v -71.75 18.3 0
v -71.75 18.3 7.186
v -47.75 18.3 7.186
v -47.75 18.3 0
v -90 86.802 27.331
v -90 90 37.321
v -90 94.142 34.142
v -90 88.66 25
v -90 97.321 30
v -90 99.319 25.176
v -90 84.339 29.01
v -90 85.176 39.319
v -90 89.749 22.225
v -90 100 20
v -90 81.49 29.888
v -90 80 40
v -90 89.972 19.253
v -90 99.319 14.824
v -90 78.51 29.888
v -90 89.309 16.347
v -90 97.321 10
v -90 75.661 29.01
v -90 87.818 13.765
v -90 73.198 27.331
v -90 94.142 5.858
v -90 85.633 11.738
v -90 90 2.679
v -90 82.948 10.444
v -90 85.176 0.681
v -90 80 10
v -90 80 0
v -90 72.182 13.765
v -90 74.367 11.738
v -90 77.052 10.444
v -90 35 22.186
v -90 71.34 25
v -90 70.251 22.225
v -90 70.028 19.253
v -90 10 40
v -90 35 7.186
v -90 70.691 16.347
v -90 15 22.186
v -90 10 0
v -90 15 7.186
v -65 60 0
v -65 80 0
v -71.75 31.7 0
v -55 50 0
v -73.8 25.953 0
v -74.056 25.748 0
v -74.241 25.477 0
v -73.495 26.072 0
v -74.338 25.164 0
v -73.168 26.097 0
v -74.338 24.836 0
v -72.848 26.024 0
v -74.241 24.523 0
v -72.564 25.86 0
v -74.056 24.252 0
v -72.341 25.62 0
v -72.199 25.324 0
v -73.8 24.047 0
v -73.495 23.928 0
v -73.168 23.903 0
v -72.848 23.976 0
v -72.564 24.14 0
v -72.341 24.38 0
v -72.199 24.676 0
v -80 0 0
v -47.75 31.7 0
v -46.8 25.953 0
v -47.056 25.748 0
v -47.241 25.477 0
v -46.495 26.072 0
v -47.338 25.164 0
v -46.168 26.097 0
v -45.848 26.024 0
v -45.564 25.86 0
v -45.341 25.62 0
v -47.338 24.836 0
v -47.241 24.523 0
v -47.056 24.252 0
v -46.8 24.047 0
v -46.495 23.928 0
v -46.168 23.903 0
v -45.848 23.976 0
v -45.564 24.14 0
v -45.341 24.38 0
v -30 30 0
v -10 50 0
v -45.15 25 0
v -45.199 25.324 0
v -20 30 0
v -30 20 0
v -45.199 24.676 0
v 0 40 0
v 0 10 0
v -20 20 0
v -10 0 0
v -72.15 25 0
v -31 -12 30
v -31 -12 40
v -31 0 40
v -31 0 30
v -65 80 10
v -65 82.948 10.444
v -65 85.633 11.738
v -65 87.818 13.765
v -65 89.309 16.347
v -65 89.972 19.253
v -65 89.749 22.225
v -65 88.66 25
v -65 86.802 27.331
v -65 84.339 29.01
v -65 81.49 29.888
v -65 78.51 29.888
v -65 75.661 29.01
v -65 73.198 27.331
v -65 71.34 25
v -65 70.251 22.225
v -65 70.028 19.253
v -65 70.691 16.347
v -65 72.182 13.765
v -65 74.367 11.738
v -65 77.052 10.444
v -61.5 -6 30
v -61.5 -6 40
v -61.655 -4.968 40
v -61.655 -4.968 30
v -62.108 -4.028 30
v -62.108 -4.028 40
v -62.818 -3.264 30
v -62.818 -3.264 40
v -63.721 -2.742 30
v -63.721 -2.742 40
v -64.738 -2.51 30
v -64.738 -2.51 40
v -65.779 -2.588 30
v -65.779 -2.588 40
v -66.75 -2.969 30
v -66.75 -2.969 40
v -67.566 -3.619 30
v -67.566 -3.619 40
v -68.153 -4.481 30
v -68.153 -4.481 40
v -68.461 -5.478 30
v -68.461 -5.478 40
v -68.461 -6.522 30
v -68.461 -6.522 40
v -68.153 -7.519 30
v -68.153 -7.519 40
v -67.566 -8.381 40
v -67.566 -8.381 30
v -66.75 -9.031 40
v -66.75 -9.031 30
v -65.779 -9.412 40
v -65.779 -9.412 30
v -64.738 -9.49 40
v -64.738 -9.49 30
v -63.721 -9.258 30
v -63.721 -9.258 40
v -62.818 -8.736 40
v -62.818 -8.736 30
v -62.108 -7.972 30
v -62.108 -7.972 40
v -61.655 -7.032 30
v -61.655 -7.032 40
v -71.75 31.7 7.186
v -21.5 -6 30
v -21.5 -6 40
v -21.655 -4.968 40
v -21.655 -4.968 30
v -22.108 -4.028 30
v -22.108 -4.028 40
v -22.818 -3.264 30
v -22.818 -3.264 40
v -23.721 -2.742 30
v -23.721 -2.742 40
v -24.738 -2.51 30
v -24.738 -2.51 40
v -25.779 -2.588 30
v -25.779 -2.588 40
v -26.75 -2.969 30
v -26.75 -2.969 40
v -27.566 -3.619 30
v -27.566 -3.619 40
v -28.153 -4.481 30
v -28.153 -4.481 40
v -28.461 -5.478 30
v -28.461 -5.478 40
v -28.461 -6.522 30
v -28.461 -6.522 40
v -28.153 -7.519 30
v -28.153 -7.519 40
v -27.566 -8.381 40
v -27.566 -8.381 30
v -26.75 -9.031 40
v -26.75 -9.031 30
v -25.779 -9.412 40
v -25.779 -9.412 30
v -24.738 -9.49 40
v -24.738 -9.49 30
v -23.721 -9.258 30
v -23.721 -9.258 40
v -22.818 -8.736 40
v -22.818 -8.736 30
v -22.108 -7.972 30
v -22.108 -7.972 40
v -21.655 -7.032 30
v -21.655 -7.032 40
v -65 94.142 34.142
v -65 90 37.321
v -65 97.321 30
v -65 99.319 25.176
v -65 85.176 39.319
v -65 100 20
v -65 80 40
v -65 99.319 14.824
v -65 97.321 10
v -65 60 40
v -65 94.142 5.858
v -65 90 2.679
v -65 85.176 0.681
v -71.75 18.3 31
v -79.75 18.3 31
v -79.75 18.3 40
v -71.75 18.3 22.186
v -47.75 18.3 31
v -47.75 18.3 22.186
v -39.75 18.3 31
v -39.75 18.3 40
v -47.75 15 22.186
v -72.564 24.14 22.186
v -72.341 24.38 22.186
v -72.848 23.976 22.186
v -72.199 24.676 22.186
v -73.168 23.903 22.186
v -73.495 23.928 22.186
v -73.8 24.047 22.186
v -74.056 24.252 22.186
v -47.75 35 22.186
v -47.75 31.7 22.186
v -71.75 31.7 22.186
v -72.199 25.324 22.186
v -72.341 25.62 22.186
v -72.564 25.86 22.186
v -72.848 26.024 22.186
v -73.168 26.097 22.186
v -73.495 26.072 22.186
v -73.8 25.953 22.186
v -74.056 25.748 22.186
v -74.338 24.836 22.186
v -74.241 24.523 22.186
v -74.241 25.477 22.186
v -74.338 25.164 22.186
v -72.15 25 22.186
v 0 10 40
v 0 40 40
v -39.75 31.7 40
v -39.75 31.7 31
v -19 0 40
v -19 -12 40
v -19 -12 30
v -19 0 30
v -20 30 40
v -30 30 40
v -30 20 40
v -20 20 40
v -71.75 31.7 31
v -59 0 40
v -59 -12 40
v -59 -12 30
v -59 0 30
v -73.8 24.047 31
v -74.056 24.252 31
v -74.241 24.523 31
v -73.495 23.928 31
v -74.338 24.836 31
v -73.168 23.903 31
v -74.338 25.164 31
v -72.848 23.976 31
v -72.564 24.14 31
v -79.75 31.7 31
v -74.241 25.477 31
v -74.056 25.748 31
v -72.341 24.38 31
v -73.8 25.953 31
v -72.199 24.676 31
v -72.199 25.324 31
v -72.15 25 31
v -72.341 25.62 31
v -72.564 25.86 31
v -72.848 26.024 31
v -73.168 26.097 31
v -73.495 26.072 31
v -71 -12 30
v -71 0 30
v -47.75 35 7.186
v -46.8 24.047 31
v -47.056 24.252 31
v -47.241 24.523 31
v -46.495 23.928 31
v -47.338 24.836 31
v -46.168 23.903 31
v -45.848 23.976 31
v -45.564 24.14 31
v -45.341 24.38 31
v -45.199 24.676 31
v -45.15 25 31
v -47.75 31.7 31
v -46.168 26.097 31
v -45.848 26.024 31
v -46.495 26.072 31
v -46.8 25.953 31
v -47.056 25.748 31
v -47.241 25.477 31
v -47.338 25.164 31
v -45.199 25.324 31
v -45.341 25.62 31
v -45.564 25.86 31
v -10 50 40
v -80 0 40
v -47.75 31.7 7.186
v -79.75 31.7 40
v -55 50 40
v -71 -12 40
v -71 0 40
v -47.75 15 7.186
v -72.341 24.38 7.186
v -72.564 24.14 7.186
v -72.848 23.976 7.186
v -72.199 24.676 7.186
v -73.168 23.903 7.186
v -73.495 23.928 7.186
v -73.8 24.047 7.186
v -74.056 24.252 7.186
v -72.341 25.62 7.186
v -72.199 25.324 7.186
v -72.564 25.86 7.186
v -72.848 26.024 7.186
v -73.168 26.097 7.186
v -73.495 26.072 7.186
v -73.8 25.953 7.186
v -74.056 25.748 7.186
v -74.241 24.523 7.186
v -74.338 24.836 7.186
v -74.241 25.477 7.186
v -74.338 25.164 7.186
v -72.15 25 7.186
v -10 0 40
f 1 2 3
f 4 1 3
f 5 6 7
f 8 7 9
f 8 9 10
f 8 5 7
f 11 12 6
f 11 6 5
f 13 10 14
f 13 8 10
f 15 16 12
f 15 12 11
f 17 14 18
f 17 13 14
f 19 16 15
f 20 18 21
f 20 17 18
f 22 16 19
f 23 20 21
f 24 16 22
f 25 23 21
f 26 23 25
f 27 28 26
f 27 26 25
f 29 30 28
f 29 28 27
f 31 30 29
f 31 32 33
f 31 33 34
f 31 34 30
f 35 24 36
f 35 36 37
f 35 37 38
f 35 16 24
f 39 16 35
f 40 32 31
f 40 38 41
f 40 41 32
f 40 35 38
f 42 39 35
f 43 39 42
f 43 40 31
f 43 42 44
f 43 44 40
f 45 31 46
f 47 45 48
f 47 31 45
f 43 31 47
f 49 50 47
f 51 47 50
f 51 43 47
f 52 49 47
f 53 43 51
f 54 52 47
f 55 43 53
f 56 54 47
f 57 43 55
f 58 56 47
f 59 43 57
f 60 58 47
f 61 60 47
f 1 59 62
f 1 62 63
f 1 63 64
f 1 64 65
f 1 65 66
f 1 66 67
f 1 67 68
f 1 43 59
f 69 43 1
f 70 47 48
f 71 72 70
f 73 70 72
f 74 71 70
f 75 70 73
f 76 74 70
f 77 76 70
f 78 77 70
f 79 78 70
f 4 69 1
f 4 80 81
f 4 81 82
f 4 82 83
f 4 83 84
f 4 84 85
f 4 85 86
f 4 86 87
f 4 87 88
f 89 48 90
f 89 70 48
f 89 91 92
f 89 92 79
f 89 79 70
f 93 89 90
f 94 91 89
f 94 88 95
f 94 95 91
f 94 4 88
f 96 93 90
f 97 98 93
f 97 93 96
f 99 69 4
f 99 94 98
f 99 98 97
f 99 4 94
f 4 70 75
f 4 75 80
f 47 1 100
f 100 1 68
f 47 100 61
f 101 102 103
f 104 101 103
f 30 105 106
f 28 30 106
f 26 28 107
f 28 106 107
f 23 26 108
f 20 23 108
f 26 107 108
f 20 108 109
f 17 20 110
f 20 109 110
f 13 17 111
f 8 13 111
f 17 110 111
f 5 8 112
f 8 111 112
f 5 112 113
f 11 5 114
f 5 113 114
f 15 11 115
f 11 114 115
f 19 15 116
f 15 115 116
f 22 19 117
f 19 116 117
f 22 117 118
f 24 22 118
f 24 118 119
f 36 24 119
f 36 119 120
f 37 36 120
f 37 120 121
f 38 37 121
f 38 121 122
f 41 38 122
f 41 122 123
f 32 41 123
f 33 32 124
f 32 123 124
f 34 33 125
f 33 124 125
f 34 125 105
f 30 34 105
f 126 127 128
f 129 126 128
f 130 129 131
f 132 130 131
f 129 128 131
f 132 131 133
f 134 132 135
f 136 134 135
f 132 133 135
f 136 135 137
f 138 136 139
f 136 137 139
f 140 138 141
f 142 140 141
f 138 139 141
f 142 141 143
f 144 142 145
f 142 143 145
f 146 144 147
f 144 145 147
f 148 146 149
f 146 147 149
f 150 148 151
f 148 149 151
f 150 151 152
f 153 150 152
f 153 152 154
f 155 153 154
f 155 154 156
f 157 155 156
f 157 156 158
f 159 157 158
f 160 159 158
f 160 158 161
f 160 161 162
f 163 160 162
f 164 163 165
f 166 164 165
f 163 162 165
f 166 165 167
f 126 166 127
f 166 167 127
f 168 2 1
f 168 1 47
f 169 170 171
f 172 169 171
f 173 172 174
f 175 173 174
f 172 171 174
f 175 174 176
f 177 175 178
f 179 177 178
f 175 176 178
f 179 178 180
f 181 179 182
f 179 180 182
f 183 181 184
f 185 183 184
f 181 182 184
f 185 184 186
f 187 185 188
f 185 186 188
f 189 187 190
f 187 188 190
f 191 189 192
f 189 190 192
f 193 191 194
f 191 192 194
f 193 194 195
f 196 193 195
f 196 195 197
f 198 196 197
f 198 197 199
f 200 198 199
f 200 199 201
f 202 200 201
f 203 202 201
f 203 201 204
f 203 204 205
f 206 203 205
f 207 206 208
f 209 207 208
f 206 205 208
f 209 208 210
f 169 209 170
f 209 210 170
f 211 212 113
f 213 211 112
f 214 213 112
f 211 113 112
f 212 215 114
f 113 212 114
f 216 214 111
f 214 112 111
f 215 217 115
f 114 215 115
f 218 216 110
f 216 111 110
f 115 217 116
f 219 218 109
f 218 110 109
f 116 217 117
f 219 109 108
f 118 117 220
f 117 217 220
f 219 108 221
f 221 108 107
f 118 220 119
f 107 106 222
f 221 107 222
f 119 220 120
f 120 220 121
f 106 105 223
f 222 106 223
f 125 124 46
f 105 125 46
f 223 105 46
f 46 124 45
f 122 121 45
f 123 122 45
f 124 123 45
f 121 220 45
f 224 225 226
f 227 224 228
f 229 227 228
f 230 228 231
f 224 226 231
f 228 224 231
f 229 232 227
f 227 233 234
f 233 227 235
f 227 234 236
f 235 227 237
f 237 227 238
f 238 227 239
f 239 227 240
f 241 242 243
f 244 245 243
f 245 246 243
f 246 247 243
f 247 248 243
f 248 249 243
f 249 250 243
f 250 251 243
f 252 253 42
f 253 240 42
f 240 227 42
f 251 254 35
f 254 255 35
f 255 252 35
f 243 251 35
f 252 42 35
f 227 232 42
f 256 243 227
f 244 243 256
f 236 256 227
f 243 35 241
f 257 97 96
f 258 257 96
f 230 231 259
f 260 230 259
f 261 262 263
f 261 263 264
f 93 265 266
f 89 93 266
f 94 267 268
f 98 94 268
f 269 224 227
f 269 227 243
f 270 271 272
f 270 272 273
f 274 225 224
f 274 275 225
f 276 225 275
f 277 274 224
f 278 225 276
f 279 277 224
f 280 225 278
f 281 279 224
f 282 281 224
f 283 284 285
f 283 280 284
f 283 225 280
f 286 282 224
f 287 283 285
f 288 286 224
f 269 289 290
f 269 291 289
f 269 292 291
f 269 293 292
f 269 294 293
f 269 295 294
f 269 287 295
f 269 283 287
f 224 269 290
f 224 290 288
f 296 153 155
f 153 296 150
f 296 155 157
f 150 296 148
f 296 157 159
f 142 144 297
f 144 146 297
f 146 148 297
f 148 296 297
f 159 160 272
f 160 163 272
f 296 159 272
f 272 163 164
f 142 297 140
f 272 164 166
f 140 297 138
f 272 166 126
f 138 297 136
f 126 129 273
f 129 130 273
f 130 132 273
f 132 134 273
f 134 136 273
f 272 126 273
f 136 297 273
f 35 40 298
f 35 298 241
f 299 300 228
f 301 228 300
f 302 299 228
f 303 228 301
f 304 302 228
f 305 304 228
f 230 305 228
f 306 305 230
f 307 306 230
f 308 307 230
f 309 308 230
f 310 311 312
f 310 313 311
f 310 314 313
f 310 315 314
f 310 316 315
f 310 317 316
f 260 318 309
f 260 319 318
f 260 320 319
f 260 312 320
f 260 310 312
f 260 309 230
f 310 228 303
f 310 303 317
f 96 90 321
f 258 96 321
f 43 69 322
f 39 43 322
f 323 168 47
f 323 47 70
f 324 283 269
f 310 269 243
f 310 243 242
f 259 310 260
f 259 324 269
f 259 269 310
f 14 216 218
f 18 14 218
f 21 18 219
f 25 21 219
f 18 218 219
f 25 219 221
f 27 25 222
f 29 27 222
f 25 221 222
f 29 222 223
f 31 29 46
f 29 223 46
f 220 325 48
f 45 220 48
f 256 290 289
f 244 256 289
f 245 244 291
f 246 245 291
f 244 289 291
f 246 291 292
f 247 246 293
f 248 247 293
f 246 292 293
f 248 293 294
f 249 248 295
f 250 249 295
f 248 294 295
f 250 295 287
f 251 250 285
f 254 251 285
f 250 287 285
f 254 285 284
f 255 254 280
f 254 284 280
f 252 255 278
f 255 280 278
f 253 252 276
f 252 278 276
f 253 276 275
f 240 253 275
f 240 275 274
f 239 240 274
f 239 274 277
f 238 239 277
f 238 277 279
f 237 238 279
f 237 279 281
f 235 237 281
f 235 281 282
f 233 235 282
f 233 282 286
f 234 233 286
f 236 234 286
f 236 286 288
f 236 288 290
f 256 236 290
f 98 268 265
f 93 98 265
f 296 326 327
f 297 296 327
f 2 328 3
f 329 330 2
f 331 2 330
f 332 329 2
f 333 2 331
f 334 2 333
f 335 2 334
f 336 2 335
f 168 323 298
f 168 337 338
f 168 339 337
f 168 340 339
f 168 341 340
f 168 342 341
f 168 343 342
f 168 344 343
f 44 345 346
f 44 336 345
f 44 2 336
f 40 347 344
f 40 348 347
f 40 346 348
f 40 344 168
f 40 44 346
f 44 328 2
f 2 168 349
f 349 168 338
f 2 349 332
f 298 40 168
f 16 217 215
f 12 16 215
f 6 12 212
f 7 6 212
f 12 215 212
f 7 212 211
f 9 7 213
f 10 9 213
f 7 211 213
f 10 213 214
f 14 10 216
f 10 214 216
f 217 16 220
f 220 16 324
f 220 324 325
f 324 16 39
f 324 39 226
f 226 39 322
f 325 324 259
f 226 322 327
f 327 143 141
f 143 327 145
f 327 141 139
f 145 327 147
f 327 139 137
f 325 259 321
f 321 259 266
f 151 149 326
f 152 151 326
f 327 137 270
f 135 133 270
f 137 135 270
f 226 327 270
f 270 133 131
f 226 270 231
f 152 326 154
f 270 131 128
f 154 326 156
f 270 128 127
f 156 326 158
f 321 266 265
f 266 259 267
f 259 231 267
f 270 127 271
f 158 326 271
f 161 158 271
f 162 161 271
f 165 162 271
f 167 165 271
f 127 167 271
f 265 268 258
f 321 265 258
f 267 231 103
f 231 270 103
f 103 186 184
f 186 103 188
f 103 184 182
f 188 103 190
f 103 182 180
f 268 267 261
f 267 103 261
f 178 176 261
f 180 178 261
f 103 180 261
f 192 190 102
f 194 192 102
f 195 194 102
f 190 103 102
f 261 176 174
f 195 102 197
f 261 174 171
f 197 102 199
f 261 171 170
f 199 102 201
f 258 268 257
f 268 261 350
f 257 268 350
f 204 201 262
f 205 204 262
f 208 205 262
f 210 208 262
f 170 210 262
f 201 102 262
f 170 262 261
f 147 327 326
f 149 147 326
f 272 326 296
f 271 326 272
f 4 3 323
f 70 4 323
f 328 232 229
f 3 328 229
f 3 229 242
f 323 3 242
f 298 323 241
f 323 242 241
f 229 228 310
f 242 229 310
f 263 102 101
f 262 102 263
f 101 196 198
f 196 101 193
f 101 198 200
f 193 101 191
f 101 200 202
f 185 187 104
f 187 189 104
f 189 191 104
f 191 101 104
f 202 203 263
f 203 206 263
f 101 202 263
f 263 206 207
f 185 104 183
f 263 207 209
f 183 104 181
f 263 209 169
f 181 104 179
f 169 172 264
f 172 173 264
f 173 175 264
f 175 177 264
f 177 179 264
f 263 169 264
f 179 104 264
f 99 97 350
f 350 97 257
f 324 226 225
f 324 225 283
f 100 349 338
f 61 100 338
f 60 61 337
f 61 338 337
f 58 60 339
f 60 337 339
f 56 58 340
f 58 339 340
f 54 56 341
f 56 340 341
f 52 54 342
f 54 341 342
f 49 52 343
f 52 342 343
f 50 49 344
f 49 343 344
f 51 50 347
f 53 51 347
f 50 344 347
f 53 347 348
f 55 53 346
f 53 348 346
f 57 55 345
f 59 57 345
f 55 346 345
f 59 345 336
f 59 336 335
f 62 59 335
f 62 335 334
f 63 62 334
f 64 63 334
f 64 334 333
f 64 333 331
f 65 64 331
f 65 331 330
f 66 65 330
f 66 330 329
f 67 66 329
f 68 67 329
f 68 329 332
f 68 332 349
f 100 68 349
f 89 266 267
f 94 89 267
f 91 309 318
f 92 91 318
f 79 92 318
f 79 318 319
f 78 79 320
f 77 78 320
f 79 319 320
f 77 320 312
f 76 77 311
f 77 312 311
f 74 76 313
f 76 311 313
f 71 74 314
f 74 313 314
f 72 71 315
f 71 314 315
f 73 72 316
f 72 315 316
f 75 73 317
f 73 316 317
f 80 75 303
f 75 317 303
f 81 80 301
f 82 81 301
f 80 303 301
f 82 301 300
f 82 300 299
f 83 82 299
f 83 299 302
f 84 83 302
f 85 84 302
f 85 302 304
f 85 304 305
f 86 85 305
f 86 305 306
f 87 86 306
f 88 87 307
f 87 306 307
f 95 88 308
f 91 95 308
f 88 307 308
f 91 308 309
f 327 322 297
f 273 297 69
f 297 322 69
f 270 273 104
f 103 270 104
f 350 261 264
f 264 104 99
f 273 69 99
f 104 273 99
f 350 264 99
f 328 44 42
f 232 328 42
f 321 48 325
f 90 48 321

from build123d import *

# Parameters (mm, degrees)
SKETCH1_W           = 90
SKETCH1_H           = 50
BOSS_EXTRUDE1_DEPTH = 40
SKETCH21_R          = 5
CUT_EXTRUDE10_DEPTH = 40
SKETCH22_W          = 40
SKETCH22_H          = 13.4
CUT_EXTRUDE11_DEPTH = 9
SKETCH24_W          = 24
SKETCH24_H          = 13.4
CUT_EXTRUDE12_DEPTH = 31
SKETCH25_R          = 1.1
CUT_EXTRUDE13_DEPTH = 31
SKETCH31_W          = 25
SKETCH31_H          = 40
BOSS_EXTRUDE2_DEPTH = 50
SKETCH32_R          = 10
CUT_EXTRUDE15_DEPTH = 25
CHAMFER1_SIZE       = 10
CUT_EXTRUDE16_REACH = 142.357
SKETCH35_W          = 15
SKETCH35_H          = 20
SKETCH36_W          = 12
SKETCH36_H          = 12
SKETCH36_R          = 3.5
BOSS_EXTRUDE3_DEPTH = 10


with BuildPart() as part:
    # Sketch1 → Boss-Extrude1 (new body)
    with BuildSketch(Plane.XY):
        with Locations((-45, 25)):
            Rectangle(SKETCH1_W, SKETCH1_H)
    extrude(amount=BOSS_EXTRUDE1_DEPTH)

    # Sketch21 → Cut-Extrude10 (cut)
    with BuildSketch(Plane.XY.offset(40)):
        with Locations((-25, 25)):
            Circle(SKETCH21_R)
        with BuildLine():
            Line((-25, 30), (-30, 30))
            Line((-30, 30), (-30, 25))
            ThreePointArc((-30, 25), (-28.535533906, 28.535533906), (-25, 30))
        make_face()
        with BuildLine():
            ThreePointArc((-25, 20), (-28.535533906, 21.464466094), (-30, 25))
            Line((-30, 25), (-30, 20))
            Line((-30, 20), (-25, 20))
        make_face()
        with BuildLine():
            Line((-20, 20), (-20, 25))
            ThreePointArc((-20, 25), (-21.464466094, 21.464466094), (-25, 20))
            Line((-25, 20), (-20, 20))
        make_face()
        with BuildLine():
            Line((-20, 30), (-25, 30))
            ThreePointArc((-25, 30), (-21.464466094, 28.535533906), (-20, 25))
            Line((-20, 25), (-20, 30))
        make_face()
    extrude(amount=-CUT_EXTRUDE10_DEPTH, mode=Mode.SUBTRACT)

    # Sketch22 → Cut-Extrude11 (cut)
    with BuildSketch(Plane.XY.offset(40)):
        with Locations((-59.75, 25)):
            Rectangle(SKETCH22_W, SKETCH22_H)
    extrude(amount=-CUT_EXTRUDE11_DEPTH, mode=Mode.SUBTRACT)

    # Sketch24 → Cut-Extrude12 (cut)
    with BuildSketch(Plane.XY.offset(31)):
        with Locations((-59.75, 25)):
            Rectangle(SKETCH24_W, SKETCH24_H)
    extrude(amount=-CUT_EXTRUDE12_DEPTH, mode=Mode.SUBTRACT)

    # Sketch25 → Cut-Extrude13 (cut)
    with BuildSketch(Plane.XY.offset(31)):
        with Locations((-73.25, 25)):
            Circle(SKETCH25_R)
        with Locations((-46.25, 25)):
            Circle(SKETCH25_R)
    extrude(amount=-CUT_EXTRUDE13_DEPTH, mode=Mode.SUBTRACT)

    # Sketch31 → Boss-Extrude2 (add)
    with BuildSketch(Plane(origin=(0, 50, 0), x_dir=(1, 0, 0), z_dir=(0, 1, 0))):
        with Locations((-77.5, -20)):
            Rectangle(SKETCH31_W, SKETCH31_H)
    extrude(amount=BOSS_EXTRUDE2_DEPTH)

    # Sketch32 → Cut-Extrude15 (cut)
    with BuildSketch(Plane(origin=(-65, 0, 0), x_dir=(0, 0, -1), z_dir=(1, 0, 0))):
        with BuildLine():
            ThreePointArc((-40, 80), (-34.142135624, 94.142135624), (-20, 100))
            Line((-20, 100), (-40, 100))
            Line((-40, 100), (-40, 80))
        make_face()
        with BuildLine():
            ThreePointArc((-20, 100), (-5.857864376, 94.142135624), (0, 80))
            Line((0, 80), (0, 100))
            Line((0, 100), (-20, 100))
        make_face()
        with Locations((-20, 80)):
            Circle(SKETCH32_R)
    extrude(amount=-CUT_EXTRUDE15_DEPTH, mode=Mode.SUBTRACT)

    # Chamfer1
    chamfer1_edges = [part.edges().sort_by_distance(p)[0] for p in [
        (-65, 50, 20),
        (0, 50, 20),
        (0, 0, 20),
        (-90, 0, 20),
    ]]
    chamfer(chamfer1_edges, length=CHAMFER1_SIZE)

    # Cut-Extrude16: up to this face of the body (flat: up to its plane)
    cut_extrude16_end = Plane(part.part.faces().sort_by_distance((-47.75, 25, 15.5))[0])
    # Sketch35 → Cut-Extrude16 (cut, up to the picked face)
    with BuildSketch(Plane.ZY.offset(90), mode=Mode.PRIVATE) as cut_extrude16_sk1:
        with Locations((14.686432503, 25)):
            Rectangle(SKETCH35_W, SKETCH35_H)
    cut_extrude16_tool1 = split(extrude(cut_extrude16_sk1.sketch, amount=-CUT_EXTRUDE16_REACH, mode=Mode.PRIVATE), bisect_by=cut_extrude16_end, keep=Keep.BOTH, mode=Mode.PRIVATE)
    add(cut_extrude16_tool1.solids().sort_by(Axis((-90, 25, 14.686433), (1, 0, 0)))[0], mode=Mode.SUBTRACT)

    # Sketch36 → Boss-Extrude3 (add)
    # profile 1 of 2: a face of its own
    with BuildSketch(Plane.XY.offset(40)):
        with Locations((-65, -6)):
            Rectangle(SKETCH36_W, SKETCH36_H)
        with Locations((-65, -6)):
            Circle(SKETCH36_R, mode=Mode.SUBTRACT)
    # profile 2 of 2: a face of its own
    with BuildSketch(Plane.XY.offset(40)):
        with Locations((-25, -6)):
            Rectangle(SKETCH36_W, SKETCH36_H)
        with Locations((-25, -6)):
            Circle(SKETCH36_R, mode=Mode.SUBTRACT)
    extrude(amount=-BOSS_EXTRUDE3_DEPTH)


solid = part.part
